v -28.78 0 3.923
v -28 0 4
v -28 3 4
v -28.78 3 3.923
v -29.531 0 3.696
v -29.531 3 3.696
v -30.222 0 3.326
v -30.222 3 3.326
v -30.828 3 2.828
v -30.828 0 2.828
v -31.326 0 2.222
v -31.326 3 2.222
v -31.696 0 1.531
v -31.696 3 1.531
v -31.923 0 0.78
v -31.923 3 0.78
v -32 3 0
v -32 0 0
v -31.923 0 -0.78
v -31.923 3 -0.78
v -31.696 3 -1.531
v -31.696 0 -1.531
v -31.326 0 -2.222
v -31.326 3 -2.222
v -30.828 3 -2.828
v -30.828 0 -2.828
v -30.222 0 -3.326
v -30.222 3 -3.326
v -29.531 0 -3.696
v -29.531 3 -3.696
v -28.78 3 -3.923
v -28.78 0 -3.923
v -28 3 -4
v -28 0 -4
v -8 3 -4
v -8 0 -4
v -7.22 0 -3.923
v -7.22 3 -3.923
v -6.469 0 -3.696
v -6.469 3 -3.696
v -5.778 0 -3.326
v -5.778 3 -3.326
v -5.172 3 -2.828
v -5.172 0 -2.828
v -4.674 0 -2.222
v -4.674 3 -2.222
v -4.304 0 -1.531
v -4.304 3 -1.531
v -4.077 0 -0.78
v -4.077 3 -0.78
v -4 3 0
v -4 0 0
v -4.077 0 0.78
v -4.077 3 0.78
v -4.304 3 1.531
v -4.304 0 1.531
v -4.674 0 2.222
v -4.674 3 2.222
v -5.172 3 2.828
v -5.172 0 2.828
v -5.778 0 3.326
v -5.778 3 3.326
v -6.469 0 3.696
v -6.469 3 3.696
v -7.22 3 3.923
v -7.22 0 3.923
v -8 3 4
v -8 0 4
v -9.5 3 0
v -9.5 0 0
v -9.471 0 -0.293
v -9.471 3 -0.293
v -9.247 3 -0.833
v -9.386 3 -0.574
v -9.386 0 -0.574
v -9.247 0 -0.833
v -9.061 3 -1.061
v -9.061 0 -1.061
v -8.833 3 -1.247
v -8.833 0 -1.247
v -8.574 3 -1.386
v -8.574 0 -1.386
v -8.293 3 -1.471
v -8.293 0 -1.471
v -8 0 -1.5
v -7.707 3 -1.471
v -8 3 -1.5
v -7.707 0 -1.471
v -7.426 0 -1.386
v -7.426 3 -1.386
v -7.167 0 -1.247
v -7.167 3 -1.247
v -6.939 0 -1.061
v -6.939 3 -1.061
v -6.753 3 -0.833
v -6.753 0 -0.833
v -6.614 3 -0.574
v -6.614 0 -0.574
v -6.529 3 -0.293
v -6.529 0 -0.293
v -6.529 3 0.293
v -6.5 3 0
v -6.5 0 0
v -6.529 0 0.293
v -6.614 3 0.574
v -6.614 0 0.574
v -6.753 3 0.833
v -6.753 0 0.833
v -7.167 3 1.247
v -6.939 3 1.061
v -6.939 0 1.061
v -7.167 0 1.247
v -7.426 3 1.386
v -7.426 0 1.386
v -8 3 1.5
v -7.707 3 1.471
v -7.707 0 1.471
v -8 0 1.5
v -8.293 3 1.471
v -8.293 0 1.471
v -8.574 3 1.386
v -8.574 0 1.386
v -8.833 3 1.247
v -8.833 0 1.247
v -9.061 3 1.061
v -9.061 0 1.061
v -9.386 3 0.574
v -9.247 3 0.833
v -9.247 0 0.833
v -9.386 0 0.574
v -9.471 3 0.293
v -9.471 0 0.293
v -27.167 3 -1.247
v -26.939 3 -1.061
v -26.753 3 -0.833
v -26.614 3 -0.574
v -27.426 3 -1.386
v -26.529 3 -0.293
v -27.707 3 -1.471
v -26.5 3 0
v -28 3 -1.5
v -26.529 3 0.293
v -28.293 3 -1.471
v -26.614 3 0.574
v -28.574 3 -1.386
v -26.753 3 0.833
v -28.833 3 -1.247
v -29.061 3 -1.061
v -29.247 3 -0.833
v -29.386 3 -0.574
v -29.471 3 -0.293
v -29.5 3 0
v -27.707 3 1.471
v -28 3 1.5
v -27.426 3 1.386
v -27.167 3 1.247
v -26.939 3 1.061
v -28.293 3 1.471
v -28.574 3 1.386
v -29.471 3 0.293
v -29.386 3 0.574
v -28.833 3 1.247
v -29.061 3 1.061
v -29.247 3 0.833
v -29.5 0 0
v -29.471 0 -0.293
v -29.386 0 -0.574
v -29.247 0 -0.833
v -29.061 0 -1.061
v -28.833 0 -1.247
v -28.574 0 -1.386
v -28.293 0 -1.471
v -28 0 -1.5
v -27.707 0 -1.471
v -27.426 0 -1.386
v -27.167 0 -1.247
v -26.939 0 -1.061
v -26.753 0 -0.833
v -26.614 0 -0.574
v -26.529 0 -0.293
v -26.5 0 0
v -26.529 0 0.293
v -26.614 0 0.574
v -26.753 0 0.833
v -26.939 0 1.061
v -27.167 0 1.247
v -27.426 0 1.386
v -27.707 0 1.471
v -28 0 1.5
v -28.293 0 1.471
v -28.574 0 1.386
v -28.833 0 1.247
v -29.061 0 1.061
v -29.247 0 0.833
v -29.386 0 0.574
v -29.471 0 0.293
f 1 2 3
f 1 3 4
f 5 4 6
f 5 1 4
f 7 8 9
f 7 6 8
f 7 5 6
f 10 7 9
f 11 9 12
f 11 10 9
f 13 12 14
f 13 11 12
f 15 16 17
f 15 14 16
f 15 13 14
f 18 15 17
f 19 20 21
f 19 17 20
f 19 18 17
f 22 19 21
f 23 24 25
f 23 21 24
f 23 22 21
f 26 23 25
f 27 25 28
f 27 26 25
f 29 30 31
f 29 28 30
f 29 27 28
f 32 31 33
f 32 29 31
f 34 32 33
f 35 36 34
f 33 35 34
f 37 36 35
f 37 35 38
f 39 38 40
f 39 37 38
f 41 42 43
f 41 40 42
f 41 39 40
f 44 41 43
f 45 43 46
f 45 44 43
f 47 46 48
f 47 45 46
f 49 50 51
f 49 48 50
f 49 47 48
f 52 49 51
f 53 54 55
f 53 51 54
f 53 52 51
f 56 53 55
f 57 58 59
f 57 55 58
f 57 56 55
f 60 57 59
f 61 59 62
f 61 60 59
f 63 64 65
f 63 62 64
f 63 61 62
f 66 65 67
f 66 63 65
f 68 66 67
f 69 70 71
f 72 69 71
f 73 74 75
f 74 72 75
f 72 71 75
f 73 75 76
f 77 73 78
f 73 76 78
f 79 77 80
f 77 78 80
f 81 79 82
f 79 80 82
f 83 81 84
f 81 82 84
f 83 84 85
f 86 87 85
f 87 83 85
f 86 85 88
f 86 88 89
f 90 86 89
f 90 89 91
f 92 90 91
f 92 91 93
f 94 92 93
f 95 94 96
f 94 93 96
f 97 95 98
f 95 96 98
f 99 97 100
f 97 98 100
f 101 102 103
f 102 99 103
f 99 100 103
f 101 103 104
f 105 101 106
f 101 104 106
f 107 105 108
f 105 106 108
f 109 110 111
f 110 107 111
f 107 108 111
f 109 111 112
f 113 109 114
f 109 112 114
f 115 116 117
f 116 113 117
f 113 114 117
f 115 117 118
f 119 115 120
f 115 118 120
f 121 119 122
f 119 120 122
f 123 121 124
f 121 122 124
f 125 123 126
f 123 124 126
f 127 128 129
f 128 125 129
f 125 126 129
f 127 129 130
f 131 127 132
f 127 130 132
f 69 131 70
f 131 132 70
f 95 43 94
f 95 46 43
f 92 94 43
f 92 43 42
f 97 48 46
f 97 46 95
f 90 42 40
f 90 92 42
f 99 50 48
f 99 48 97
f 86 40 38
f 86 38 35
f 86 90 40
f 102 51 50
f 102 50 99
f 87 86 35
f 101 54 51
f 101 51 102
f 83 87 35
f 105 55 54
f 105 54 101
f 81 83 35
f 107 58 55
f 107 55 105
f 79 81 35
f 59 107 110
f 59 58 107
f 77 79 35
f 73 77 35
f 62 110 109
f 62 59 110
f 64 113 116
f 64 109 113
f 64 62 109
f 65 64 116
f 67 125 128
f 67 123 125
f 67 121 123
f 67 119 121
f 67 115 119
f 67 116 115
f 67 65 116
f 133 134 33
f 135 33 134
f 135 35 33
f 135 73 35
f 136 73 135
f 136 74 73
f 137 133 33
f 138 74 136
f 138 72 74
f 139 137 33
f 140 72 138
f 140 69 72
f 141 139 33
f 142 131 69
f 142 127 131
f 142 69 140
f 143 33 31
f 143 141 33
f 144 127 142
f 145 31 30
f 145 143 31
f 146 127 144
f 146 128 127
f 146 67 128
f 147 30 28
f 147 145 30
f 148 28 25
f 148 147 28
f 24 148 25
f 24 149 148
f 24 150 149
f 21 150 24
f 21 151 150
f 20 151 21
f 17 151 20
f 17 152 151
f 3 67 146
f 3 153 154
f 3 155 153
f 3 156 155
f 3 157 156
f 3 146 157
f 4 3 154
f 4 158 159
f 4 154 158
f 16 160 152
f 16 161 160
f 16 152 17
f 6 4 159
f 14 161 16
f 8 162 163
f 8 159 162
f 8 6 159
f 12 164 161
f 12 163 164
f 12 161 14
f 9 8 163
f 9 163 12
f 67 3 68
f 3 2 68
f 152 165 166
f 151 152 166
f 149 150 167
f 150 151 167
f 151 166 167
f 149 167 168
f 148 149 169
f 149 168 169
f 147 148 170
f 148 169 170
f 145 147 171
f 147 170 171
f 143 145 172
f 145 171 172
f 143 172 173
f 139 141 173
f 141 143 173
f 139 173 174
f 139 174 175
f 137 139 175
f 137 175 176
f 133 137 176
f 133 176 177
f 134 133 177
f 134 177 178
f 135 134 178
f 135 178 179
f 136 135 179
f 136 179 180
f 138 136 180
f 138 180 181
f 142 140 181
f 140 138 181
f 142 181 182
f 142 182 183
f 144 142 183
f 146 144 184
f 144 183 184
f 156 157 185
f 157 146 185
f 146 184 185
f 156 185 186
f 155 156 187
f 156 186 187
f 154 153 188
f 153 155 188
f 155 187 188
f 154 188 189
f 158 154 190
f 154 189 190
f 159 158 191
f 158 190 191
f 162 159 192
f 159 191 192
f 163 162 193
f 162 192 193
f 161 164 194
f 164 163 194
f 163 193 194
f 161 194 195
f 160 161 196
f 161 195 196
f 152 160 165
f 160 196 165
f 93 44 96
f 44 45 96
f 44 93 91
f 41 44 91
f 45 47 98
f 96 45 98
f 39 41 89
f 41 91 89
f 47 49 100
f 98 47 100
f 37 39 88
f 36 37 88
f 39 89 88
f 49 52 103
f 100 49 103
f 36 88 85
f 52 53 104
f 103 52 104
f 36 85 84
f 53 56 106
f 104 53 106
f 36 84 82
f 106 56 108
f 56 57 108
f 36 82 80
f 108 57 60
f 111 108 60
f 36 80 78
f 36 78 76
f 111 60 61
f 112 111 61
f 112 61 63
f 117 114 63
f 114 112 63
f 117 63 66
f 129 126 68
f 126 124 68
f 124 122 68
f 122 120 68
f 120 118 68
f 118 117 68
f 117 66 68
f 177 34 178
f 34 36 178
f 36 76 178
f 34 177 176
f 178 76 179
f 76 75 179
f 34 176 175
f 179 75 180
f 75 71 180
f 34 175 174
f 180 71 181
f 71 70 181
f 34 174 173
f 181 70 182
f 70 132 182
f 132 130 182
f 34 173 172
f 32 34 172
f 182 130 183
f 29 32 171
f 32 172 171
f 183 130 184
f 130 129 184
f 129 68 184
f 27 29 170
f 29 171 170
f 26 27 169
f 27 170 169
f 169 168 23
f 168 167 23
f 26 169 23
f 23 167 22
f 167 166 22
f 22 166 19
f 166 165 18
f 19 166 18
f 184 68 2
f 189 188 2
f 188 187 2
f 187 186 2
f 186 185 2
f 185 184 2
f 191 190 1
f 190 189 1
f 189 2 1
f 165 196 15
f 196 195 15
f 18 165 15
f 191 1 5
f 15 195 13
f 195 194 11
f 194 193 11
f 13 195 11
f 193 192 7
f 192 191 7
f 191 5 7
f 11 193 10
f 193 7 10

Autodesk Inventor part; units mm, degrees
ref_plane "YZ Plane" through (0, 0, 0) normal (1, 0, 0) x (0, 1, 0)
ref_plane "XZ Plane" through (0, 0, 0) normal (0, 1, 0) x (-1, 0, 0)
ref_plane "XY Plane" through (0, 0, 0) normal (0, 0, 1) x (1, 0, 0)
sketch "Sketch1" plane through (0, 0, 0) normal (0, 1, 0) x (-1, 0, 0)
  circle A0 centre (28, 0) radius 1.5
  circle A1 centre (8, 0) radius 1.5
  arc A2 (28, -4) -> (28, 4) centre (28, 0) ccw
  arc A3 (8, 4) -> (8, -4) centre (8, 0) ccw
  line L0 (28, 4) -> (8, 4)
  line L1 (8, -4) -> (28, -4)
  point P0 (0, 0)
  dimension "d0" = 3
  dimension "d1" = 4
  dimension "d2" = 4
  dimension "d5" = 20
extrude "Extrusion1" add sketch "Sketch1" along normal blind 3
properties part number "Light gate compression plate" material "Polycarbonate, Smoke"
